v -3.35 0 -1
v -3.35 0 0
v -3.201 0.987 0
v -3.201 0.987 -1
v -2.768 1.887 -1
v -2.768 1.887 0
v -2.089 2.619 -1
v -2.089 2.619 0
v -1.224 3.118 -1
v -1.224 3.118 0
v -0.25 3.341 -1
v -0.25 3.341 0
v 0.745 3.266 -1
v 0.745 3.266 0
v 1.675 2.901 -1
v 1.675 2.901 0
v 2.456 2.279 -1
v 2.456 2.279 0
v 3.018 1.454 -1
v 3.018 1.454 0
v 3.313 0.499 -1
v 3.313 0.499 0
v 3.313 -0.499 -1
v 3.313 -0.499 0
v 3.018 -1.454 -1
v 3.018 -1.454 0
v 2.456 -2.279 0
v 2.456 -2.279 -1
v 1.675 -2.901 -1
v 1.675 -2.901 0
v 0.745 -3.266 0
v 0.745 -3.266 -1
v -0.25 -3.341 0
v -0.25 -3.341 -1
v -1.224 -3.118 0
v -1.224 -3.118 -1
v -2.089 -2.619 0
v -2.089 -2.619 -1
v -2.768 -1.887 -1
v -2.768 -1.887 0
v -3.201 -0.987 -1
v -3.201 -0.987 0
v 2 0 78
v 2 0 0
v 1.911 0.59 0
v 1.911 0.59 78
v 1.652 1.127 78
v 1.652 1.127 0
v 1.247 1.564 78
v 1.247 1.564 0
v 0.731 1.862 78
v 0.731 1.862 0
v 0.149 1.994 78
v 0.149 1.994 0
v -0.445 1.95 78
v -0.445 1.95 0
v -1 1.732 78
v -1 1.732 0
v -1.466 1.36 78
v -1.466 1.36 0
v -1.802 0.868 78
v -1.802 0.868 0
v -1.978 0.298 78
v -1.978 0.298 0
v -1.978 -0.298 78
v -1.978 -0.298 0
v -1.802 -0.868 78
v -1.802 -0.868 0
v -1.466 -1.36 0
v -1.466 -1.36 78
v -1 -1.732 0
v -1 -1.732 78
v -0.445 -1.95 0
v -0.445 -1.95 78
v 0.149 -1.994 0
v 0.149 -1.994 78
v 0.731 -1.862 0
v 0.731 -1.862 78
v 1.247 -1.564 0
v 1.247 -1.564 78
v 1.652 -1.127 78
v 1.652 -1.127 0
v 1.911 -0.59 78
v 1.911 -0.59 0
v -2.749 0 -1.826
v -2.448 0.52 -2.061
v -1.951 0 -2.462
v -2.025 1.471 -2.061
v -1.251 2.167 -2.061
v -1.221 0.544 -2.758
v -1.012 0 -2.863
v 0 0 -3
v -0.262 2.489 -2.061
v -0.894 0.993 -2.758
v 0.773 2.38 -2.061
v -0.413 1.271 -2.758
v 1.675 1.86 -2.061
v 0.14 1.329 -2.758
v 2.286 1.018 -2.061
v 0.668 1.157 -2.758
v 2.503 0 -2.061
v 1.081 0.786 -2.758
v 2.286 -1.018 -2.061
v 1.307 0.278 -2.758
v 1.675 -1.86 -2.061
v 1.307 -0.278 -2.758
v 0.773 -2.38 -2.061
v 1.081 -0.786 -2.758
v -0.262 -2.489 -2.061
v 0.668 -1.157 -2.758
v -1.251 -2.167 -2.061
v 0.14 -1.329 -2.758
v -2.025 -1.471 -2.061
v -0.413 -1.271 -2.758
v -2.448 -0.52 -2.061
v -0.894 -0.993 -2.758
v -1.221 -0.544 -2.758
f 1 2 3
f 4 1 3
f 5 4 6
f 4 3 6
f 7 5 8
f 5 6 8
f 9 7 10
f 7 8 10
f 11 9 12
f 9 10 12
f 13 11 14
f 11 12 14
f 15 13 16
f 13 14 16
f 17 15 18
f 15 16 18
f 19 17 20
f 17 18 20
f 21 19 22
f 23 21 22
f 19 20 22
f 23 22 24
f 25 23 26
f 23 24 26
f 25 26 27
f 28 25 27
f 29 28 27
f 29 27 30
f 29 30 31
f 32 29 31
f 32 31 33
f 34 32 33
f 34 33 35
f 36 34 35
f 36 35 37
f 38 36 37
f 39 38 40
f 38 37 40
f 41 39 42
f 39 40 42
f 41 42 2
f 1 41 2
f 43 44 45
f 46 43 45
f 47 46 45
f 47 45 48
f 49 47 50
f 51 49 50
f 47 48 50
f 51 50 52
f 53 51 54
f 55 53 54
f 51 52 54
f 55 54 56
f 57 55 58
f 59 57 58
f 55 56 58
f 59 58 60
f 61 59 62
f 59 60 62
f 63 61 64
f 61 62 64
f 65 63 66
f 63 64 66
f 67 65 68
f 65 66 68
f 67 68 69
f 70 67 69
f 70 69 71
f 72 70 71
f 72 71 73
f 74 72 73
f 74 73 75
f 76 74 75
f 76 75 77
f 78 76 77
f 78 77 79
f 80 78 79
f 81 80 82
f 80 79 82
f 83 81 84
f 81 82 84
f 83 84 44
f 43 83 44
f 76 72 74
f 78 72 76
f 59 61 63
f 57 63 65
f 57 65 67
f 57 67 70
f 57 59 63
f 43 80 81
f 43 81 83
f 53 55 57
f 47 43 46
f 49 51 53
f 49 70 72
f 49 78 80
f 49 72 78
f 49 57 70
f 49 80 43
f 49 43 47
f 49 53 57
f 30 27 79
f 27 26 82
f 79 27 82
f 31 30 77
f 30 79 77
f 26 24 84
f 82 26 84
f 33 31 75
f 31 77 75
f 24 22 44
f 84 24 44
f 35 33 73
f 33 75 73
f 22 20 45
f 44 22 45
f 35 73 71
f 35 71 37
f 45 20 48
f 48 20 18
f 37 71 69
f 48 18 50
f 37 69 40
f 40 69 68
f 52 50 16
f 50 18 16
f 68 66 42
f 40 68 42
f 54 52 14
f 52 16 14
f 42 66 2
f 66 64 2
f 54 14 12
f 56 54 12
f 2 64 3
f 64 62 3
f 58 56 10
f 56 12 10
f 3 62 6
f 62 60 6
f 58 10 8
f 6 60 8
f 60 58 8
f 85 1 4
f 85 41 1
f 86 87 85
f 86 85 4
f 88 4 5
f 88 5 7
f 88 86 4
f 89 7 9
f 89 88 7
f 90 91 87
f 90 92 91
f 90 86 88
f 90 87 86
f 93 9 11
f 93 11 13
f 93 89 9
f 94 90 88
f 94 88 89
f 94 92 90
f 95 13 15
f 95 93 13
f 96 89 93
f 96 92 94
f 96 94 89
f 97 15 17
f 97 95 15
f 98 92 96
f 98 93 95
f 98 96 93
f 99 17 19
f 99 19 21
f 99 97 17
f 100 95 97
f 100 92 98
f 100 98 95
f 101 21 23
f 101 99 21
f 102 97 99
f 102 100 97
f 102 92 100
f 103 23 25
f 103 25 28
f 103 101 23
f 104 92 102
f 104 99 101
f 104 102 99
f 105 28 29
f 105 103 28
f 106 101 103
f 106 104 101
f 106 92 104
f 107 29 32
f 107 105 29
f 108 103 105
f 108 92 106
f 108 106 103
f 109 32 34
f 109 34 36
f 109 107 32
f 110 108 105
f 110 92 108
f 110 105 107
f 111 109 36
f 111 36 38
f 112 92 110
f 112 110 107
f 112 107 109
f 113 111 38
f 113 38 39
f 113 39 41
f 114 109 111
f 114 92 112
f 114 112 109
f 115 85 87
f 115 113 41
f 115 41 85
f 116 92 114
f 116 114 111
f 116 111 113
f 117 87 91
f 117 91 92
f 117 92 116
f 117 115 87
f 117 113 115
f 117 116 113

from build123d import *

# Parameters (mm, degrees)
SKETCH1_R         = 2
EXTRUDE1_DEPTH    = 78
SKETCH2_R         = 3.35
EXTRUDE2_DEPTH    = 1
DOME1_FACE_RADIUS = 3.35
DOME1_HEIGHT      = 2


with BuildPart() as part:
    # Sketch1 → Extrude1 (new body)
    with BuildSketch(Plane.XY):
        Circle(SKETCH1_R)
    extrude(amount=EXTRUDE1_DEPTH)

    # Sketch2 → Extrude2 (add)
    with BuildSketch(Plane(origin=(0, 0, 0), x_dir=(-1, 0, 0), z_dir=(0, 0, -1))):
        Circle(SKETCH2_R)
    extrude(amount=EXTRUDE2_DEPTH)

    # Dome1: a dome of height H over a round flat face of radius A is a cap of a sphere of radius (A * A + H * H) / (2 * H)
    dome1_r = (DOME1_FACE_RADIUS * DOME1_FACE_RADIUS + DOME1_HEIGHT * DOME1_HEIGHT) / (2 * DOME1_HEIGHT)
    dome1_base = Plane((0, 0, -1), z_dir=(0, 0, -1))
    with Locations(dome1_base.offset(DOME1_HEIGHT - dome1_r)):
        dome1_ball = Sphere(dome1_r, mode=Mode.PRIVATE)
    add(split(dome1_ball, bisect_by=dome1_base, keep=Keep.TOP, mode=Mode.PRIVATE))


solid = part.part
